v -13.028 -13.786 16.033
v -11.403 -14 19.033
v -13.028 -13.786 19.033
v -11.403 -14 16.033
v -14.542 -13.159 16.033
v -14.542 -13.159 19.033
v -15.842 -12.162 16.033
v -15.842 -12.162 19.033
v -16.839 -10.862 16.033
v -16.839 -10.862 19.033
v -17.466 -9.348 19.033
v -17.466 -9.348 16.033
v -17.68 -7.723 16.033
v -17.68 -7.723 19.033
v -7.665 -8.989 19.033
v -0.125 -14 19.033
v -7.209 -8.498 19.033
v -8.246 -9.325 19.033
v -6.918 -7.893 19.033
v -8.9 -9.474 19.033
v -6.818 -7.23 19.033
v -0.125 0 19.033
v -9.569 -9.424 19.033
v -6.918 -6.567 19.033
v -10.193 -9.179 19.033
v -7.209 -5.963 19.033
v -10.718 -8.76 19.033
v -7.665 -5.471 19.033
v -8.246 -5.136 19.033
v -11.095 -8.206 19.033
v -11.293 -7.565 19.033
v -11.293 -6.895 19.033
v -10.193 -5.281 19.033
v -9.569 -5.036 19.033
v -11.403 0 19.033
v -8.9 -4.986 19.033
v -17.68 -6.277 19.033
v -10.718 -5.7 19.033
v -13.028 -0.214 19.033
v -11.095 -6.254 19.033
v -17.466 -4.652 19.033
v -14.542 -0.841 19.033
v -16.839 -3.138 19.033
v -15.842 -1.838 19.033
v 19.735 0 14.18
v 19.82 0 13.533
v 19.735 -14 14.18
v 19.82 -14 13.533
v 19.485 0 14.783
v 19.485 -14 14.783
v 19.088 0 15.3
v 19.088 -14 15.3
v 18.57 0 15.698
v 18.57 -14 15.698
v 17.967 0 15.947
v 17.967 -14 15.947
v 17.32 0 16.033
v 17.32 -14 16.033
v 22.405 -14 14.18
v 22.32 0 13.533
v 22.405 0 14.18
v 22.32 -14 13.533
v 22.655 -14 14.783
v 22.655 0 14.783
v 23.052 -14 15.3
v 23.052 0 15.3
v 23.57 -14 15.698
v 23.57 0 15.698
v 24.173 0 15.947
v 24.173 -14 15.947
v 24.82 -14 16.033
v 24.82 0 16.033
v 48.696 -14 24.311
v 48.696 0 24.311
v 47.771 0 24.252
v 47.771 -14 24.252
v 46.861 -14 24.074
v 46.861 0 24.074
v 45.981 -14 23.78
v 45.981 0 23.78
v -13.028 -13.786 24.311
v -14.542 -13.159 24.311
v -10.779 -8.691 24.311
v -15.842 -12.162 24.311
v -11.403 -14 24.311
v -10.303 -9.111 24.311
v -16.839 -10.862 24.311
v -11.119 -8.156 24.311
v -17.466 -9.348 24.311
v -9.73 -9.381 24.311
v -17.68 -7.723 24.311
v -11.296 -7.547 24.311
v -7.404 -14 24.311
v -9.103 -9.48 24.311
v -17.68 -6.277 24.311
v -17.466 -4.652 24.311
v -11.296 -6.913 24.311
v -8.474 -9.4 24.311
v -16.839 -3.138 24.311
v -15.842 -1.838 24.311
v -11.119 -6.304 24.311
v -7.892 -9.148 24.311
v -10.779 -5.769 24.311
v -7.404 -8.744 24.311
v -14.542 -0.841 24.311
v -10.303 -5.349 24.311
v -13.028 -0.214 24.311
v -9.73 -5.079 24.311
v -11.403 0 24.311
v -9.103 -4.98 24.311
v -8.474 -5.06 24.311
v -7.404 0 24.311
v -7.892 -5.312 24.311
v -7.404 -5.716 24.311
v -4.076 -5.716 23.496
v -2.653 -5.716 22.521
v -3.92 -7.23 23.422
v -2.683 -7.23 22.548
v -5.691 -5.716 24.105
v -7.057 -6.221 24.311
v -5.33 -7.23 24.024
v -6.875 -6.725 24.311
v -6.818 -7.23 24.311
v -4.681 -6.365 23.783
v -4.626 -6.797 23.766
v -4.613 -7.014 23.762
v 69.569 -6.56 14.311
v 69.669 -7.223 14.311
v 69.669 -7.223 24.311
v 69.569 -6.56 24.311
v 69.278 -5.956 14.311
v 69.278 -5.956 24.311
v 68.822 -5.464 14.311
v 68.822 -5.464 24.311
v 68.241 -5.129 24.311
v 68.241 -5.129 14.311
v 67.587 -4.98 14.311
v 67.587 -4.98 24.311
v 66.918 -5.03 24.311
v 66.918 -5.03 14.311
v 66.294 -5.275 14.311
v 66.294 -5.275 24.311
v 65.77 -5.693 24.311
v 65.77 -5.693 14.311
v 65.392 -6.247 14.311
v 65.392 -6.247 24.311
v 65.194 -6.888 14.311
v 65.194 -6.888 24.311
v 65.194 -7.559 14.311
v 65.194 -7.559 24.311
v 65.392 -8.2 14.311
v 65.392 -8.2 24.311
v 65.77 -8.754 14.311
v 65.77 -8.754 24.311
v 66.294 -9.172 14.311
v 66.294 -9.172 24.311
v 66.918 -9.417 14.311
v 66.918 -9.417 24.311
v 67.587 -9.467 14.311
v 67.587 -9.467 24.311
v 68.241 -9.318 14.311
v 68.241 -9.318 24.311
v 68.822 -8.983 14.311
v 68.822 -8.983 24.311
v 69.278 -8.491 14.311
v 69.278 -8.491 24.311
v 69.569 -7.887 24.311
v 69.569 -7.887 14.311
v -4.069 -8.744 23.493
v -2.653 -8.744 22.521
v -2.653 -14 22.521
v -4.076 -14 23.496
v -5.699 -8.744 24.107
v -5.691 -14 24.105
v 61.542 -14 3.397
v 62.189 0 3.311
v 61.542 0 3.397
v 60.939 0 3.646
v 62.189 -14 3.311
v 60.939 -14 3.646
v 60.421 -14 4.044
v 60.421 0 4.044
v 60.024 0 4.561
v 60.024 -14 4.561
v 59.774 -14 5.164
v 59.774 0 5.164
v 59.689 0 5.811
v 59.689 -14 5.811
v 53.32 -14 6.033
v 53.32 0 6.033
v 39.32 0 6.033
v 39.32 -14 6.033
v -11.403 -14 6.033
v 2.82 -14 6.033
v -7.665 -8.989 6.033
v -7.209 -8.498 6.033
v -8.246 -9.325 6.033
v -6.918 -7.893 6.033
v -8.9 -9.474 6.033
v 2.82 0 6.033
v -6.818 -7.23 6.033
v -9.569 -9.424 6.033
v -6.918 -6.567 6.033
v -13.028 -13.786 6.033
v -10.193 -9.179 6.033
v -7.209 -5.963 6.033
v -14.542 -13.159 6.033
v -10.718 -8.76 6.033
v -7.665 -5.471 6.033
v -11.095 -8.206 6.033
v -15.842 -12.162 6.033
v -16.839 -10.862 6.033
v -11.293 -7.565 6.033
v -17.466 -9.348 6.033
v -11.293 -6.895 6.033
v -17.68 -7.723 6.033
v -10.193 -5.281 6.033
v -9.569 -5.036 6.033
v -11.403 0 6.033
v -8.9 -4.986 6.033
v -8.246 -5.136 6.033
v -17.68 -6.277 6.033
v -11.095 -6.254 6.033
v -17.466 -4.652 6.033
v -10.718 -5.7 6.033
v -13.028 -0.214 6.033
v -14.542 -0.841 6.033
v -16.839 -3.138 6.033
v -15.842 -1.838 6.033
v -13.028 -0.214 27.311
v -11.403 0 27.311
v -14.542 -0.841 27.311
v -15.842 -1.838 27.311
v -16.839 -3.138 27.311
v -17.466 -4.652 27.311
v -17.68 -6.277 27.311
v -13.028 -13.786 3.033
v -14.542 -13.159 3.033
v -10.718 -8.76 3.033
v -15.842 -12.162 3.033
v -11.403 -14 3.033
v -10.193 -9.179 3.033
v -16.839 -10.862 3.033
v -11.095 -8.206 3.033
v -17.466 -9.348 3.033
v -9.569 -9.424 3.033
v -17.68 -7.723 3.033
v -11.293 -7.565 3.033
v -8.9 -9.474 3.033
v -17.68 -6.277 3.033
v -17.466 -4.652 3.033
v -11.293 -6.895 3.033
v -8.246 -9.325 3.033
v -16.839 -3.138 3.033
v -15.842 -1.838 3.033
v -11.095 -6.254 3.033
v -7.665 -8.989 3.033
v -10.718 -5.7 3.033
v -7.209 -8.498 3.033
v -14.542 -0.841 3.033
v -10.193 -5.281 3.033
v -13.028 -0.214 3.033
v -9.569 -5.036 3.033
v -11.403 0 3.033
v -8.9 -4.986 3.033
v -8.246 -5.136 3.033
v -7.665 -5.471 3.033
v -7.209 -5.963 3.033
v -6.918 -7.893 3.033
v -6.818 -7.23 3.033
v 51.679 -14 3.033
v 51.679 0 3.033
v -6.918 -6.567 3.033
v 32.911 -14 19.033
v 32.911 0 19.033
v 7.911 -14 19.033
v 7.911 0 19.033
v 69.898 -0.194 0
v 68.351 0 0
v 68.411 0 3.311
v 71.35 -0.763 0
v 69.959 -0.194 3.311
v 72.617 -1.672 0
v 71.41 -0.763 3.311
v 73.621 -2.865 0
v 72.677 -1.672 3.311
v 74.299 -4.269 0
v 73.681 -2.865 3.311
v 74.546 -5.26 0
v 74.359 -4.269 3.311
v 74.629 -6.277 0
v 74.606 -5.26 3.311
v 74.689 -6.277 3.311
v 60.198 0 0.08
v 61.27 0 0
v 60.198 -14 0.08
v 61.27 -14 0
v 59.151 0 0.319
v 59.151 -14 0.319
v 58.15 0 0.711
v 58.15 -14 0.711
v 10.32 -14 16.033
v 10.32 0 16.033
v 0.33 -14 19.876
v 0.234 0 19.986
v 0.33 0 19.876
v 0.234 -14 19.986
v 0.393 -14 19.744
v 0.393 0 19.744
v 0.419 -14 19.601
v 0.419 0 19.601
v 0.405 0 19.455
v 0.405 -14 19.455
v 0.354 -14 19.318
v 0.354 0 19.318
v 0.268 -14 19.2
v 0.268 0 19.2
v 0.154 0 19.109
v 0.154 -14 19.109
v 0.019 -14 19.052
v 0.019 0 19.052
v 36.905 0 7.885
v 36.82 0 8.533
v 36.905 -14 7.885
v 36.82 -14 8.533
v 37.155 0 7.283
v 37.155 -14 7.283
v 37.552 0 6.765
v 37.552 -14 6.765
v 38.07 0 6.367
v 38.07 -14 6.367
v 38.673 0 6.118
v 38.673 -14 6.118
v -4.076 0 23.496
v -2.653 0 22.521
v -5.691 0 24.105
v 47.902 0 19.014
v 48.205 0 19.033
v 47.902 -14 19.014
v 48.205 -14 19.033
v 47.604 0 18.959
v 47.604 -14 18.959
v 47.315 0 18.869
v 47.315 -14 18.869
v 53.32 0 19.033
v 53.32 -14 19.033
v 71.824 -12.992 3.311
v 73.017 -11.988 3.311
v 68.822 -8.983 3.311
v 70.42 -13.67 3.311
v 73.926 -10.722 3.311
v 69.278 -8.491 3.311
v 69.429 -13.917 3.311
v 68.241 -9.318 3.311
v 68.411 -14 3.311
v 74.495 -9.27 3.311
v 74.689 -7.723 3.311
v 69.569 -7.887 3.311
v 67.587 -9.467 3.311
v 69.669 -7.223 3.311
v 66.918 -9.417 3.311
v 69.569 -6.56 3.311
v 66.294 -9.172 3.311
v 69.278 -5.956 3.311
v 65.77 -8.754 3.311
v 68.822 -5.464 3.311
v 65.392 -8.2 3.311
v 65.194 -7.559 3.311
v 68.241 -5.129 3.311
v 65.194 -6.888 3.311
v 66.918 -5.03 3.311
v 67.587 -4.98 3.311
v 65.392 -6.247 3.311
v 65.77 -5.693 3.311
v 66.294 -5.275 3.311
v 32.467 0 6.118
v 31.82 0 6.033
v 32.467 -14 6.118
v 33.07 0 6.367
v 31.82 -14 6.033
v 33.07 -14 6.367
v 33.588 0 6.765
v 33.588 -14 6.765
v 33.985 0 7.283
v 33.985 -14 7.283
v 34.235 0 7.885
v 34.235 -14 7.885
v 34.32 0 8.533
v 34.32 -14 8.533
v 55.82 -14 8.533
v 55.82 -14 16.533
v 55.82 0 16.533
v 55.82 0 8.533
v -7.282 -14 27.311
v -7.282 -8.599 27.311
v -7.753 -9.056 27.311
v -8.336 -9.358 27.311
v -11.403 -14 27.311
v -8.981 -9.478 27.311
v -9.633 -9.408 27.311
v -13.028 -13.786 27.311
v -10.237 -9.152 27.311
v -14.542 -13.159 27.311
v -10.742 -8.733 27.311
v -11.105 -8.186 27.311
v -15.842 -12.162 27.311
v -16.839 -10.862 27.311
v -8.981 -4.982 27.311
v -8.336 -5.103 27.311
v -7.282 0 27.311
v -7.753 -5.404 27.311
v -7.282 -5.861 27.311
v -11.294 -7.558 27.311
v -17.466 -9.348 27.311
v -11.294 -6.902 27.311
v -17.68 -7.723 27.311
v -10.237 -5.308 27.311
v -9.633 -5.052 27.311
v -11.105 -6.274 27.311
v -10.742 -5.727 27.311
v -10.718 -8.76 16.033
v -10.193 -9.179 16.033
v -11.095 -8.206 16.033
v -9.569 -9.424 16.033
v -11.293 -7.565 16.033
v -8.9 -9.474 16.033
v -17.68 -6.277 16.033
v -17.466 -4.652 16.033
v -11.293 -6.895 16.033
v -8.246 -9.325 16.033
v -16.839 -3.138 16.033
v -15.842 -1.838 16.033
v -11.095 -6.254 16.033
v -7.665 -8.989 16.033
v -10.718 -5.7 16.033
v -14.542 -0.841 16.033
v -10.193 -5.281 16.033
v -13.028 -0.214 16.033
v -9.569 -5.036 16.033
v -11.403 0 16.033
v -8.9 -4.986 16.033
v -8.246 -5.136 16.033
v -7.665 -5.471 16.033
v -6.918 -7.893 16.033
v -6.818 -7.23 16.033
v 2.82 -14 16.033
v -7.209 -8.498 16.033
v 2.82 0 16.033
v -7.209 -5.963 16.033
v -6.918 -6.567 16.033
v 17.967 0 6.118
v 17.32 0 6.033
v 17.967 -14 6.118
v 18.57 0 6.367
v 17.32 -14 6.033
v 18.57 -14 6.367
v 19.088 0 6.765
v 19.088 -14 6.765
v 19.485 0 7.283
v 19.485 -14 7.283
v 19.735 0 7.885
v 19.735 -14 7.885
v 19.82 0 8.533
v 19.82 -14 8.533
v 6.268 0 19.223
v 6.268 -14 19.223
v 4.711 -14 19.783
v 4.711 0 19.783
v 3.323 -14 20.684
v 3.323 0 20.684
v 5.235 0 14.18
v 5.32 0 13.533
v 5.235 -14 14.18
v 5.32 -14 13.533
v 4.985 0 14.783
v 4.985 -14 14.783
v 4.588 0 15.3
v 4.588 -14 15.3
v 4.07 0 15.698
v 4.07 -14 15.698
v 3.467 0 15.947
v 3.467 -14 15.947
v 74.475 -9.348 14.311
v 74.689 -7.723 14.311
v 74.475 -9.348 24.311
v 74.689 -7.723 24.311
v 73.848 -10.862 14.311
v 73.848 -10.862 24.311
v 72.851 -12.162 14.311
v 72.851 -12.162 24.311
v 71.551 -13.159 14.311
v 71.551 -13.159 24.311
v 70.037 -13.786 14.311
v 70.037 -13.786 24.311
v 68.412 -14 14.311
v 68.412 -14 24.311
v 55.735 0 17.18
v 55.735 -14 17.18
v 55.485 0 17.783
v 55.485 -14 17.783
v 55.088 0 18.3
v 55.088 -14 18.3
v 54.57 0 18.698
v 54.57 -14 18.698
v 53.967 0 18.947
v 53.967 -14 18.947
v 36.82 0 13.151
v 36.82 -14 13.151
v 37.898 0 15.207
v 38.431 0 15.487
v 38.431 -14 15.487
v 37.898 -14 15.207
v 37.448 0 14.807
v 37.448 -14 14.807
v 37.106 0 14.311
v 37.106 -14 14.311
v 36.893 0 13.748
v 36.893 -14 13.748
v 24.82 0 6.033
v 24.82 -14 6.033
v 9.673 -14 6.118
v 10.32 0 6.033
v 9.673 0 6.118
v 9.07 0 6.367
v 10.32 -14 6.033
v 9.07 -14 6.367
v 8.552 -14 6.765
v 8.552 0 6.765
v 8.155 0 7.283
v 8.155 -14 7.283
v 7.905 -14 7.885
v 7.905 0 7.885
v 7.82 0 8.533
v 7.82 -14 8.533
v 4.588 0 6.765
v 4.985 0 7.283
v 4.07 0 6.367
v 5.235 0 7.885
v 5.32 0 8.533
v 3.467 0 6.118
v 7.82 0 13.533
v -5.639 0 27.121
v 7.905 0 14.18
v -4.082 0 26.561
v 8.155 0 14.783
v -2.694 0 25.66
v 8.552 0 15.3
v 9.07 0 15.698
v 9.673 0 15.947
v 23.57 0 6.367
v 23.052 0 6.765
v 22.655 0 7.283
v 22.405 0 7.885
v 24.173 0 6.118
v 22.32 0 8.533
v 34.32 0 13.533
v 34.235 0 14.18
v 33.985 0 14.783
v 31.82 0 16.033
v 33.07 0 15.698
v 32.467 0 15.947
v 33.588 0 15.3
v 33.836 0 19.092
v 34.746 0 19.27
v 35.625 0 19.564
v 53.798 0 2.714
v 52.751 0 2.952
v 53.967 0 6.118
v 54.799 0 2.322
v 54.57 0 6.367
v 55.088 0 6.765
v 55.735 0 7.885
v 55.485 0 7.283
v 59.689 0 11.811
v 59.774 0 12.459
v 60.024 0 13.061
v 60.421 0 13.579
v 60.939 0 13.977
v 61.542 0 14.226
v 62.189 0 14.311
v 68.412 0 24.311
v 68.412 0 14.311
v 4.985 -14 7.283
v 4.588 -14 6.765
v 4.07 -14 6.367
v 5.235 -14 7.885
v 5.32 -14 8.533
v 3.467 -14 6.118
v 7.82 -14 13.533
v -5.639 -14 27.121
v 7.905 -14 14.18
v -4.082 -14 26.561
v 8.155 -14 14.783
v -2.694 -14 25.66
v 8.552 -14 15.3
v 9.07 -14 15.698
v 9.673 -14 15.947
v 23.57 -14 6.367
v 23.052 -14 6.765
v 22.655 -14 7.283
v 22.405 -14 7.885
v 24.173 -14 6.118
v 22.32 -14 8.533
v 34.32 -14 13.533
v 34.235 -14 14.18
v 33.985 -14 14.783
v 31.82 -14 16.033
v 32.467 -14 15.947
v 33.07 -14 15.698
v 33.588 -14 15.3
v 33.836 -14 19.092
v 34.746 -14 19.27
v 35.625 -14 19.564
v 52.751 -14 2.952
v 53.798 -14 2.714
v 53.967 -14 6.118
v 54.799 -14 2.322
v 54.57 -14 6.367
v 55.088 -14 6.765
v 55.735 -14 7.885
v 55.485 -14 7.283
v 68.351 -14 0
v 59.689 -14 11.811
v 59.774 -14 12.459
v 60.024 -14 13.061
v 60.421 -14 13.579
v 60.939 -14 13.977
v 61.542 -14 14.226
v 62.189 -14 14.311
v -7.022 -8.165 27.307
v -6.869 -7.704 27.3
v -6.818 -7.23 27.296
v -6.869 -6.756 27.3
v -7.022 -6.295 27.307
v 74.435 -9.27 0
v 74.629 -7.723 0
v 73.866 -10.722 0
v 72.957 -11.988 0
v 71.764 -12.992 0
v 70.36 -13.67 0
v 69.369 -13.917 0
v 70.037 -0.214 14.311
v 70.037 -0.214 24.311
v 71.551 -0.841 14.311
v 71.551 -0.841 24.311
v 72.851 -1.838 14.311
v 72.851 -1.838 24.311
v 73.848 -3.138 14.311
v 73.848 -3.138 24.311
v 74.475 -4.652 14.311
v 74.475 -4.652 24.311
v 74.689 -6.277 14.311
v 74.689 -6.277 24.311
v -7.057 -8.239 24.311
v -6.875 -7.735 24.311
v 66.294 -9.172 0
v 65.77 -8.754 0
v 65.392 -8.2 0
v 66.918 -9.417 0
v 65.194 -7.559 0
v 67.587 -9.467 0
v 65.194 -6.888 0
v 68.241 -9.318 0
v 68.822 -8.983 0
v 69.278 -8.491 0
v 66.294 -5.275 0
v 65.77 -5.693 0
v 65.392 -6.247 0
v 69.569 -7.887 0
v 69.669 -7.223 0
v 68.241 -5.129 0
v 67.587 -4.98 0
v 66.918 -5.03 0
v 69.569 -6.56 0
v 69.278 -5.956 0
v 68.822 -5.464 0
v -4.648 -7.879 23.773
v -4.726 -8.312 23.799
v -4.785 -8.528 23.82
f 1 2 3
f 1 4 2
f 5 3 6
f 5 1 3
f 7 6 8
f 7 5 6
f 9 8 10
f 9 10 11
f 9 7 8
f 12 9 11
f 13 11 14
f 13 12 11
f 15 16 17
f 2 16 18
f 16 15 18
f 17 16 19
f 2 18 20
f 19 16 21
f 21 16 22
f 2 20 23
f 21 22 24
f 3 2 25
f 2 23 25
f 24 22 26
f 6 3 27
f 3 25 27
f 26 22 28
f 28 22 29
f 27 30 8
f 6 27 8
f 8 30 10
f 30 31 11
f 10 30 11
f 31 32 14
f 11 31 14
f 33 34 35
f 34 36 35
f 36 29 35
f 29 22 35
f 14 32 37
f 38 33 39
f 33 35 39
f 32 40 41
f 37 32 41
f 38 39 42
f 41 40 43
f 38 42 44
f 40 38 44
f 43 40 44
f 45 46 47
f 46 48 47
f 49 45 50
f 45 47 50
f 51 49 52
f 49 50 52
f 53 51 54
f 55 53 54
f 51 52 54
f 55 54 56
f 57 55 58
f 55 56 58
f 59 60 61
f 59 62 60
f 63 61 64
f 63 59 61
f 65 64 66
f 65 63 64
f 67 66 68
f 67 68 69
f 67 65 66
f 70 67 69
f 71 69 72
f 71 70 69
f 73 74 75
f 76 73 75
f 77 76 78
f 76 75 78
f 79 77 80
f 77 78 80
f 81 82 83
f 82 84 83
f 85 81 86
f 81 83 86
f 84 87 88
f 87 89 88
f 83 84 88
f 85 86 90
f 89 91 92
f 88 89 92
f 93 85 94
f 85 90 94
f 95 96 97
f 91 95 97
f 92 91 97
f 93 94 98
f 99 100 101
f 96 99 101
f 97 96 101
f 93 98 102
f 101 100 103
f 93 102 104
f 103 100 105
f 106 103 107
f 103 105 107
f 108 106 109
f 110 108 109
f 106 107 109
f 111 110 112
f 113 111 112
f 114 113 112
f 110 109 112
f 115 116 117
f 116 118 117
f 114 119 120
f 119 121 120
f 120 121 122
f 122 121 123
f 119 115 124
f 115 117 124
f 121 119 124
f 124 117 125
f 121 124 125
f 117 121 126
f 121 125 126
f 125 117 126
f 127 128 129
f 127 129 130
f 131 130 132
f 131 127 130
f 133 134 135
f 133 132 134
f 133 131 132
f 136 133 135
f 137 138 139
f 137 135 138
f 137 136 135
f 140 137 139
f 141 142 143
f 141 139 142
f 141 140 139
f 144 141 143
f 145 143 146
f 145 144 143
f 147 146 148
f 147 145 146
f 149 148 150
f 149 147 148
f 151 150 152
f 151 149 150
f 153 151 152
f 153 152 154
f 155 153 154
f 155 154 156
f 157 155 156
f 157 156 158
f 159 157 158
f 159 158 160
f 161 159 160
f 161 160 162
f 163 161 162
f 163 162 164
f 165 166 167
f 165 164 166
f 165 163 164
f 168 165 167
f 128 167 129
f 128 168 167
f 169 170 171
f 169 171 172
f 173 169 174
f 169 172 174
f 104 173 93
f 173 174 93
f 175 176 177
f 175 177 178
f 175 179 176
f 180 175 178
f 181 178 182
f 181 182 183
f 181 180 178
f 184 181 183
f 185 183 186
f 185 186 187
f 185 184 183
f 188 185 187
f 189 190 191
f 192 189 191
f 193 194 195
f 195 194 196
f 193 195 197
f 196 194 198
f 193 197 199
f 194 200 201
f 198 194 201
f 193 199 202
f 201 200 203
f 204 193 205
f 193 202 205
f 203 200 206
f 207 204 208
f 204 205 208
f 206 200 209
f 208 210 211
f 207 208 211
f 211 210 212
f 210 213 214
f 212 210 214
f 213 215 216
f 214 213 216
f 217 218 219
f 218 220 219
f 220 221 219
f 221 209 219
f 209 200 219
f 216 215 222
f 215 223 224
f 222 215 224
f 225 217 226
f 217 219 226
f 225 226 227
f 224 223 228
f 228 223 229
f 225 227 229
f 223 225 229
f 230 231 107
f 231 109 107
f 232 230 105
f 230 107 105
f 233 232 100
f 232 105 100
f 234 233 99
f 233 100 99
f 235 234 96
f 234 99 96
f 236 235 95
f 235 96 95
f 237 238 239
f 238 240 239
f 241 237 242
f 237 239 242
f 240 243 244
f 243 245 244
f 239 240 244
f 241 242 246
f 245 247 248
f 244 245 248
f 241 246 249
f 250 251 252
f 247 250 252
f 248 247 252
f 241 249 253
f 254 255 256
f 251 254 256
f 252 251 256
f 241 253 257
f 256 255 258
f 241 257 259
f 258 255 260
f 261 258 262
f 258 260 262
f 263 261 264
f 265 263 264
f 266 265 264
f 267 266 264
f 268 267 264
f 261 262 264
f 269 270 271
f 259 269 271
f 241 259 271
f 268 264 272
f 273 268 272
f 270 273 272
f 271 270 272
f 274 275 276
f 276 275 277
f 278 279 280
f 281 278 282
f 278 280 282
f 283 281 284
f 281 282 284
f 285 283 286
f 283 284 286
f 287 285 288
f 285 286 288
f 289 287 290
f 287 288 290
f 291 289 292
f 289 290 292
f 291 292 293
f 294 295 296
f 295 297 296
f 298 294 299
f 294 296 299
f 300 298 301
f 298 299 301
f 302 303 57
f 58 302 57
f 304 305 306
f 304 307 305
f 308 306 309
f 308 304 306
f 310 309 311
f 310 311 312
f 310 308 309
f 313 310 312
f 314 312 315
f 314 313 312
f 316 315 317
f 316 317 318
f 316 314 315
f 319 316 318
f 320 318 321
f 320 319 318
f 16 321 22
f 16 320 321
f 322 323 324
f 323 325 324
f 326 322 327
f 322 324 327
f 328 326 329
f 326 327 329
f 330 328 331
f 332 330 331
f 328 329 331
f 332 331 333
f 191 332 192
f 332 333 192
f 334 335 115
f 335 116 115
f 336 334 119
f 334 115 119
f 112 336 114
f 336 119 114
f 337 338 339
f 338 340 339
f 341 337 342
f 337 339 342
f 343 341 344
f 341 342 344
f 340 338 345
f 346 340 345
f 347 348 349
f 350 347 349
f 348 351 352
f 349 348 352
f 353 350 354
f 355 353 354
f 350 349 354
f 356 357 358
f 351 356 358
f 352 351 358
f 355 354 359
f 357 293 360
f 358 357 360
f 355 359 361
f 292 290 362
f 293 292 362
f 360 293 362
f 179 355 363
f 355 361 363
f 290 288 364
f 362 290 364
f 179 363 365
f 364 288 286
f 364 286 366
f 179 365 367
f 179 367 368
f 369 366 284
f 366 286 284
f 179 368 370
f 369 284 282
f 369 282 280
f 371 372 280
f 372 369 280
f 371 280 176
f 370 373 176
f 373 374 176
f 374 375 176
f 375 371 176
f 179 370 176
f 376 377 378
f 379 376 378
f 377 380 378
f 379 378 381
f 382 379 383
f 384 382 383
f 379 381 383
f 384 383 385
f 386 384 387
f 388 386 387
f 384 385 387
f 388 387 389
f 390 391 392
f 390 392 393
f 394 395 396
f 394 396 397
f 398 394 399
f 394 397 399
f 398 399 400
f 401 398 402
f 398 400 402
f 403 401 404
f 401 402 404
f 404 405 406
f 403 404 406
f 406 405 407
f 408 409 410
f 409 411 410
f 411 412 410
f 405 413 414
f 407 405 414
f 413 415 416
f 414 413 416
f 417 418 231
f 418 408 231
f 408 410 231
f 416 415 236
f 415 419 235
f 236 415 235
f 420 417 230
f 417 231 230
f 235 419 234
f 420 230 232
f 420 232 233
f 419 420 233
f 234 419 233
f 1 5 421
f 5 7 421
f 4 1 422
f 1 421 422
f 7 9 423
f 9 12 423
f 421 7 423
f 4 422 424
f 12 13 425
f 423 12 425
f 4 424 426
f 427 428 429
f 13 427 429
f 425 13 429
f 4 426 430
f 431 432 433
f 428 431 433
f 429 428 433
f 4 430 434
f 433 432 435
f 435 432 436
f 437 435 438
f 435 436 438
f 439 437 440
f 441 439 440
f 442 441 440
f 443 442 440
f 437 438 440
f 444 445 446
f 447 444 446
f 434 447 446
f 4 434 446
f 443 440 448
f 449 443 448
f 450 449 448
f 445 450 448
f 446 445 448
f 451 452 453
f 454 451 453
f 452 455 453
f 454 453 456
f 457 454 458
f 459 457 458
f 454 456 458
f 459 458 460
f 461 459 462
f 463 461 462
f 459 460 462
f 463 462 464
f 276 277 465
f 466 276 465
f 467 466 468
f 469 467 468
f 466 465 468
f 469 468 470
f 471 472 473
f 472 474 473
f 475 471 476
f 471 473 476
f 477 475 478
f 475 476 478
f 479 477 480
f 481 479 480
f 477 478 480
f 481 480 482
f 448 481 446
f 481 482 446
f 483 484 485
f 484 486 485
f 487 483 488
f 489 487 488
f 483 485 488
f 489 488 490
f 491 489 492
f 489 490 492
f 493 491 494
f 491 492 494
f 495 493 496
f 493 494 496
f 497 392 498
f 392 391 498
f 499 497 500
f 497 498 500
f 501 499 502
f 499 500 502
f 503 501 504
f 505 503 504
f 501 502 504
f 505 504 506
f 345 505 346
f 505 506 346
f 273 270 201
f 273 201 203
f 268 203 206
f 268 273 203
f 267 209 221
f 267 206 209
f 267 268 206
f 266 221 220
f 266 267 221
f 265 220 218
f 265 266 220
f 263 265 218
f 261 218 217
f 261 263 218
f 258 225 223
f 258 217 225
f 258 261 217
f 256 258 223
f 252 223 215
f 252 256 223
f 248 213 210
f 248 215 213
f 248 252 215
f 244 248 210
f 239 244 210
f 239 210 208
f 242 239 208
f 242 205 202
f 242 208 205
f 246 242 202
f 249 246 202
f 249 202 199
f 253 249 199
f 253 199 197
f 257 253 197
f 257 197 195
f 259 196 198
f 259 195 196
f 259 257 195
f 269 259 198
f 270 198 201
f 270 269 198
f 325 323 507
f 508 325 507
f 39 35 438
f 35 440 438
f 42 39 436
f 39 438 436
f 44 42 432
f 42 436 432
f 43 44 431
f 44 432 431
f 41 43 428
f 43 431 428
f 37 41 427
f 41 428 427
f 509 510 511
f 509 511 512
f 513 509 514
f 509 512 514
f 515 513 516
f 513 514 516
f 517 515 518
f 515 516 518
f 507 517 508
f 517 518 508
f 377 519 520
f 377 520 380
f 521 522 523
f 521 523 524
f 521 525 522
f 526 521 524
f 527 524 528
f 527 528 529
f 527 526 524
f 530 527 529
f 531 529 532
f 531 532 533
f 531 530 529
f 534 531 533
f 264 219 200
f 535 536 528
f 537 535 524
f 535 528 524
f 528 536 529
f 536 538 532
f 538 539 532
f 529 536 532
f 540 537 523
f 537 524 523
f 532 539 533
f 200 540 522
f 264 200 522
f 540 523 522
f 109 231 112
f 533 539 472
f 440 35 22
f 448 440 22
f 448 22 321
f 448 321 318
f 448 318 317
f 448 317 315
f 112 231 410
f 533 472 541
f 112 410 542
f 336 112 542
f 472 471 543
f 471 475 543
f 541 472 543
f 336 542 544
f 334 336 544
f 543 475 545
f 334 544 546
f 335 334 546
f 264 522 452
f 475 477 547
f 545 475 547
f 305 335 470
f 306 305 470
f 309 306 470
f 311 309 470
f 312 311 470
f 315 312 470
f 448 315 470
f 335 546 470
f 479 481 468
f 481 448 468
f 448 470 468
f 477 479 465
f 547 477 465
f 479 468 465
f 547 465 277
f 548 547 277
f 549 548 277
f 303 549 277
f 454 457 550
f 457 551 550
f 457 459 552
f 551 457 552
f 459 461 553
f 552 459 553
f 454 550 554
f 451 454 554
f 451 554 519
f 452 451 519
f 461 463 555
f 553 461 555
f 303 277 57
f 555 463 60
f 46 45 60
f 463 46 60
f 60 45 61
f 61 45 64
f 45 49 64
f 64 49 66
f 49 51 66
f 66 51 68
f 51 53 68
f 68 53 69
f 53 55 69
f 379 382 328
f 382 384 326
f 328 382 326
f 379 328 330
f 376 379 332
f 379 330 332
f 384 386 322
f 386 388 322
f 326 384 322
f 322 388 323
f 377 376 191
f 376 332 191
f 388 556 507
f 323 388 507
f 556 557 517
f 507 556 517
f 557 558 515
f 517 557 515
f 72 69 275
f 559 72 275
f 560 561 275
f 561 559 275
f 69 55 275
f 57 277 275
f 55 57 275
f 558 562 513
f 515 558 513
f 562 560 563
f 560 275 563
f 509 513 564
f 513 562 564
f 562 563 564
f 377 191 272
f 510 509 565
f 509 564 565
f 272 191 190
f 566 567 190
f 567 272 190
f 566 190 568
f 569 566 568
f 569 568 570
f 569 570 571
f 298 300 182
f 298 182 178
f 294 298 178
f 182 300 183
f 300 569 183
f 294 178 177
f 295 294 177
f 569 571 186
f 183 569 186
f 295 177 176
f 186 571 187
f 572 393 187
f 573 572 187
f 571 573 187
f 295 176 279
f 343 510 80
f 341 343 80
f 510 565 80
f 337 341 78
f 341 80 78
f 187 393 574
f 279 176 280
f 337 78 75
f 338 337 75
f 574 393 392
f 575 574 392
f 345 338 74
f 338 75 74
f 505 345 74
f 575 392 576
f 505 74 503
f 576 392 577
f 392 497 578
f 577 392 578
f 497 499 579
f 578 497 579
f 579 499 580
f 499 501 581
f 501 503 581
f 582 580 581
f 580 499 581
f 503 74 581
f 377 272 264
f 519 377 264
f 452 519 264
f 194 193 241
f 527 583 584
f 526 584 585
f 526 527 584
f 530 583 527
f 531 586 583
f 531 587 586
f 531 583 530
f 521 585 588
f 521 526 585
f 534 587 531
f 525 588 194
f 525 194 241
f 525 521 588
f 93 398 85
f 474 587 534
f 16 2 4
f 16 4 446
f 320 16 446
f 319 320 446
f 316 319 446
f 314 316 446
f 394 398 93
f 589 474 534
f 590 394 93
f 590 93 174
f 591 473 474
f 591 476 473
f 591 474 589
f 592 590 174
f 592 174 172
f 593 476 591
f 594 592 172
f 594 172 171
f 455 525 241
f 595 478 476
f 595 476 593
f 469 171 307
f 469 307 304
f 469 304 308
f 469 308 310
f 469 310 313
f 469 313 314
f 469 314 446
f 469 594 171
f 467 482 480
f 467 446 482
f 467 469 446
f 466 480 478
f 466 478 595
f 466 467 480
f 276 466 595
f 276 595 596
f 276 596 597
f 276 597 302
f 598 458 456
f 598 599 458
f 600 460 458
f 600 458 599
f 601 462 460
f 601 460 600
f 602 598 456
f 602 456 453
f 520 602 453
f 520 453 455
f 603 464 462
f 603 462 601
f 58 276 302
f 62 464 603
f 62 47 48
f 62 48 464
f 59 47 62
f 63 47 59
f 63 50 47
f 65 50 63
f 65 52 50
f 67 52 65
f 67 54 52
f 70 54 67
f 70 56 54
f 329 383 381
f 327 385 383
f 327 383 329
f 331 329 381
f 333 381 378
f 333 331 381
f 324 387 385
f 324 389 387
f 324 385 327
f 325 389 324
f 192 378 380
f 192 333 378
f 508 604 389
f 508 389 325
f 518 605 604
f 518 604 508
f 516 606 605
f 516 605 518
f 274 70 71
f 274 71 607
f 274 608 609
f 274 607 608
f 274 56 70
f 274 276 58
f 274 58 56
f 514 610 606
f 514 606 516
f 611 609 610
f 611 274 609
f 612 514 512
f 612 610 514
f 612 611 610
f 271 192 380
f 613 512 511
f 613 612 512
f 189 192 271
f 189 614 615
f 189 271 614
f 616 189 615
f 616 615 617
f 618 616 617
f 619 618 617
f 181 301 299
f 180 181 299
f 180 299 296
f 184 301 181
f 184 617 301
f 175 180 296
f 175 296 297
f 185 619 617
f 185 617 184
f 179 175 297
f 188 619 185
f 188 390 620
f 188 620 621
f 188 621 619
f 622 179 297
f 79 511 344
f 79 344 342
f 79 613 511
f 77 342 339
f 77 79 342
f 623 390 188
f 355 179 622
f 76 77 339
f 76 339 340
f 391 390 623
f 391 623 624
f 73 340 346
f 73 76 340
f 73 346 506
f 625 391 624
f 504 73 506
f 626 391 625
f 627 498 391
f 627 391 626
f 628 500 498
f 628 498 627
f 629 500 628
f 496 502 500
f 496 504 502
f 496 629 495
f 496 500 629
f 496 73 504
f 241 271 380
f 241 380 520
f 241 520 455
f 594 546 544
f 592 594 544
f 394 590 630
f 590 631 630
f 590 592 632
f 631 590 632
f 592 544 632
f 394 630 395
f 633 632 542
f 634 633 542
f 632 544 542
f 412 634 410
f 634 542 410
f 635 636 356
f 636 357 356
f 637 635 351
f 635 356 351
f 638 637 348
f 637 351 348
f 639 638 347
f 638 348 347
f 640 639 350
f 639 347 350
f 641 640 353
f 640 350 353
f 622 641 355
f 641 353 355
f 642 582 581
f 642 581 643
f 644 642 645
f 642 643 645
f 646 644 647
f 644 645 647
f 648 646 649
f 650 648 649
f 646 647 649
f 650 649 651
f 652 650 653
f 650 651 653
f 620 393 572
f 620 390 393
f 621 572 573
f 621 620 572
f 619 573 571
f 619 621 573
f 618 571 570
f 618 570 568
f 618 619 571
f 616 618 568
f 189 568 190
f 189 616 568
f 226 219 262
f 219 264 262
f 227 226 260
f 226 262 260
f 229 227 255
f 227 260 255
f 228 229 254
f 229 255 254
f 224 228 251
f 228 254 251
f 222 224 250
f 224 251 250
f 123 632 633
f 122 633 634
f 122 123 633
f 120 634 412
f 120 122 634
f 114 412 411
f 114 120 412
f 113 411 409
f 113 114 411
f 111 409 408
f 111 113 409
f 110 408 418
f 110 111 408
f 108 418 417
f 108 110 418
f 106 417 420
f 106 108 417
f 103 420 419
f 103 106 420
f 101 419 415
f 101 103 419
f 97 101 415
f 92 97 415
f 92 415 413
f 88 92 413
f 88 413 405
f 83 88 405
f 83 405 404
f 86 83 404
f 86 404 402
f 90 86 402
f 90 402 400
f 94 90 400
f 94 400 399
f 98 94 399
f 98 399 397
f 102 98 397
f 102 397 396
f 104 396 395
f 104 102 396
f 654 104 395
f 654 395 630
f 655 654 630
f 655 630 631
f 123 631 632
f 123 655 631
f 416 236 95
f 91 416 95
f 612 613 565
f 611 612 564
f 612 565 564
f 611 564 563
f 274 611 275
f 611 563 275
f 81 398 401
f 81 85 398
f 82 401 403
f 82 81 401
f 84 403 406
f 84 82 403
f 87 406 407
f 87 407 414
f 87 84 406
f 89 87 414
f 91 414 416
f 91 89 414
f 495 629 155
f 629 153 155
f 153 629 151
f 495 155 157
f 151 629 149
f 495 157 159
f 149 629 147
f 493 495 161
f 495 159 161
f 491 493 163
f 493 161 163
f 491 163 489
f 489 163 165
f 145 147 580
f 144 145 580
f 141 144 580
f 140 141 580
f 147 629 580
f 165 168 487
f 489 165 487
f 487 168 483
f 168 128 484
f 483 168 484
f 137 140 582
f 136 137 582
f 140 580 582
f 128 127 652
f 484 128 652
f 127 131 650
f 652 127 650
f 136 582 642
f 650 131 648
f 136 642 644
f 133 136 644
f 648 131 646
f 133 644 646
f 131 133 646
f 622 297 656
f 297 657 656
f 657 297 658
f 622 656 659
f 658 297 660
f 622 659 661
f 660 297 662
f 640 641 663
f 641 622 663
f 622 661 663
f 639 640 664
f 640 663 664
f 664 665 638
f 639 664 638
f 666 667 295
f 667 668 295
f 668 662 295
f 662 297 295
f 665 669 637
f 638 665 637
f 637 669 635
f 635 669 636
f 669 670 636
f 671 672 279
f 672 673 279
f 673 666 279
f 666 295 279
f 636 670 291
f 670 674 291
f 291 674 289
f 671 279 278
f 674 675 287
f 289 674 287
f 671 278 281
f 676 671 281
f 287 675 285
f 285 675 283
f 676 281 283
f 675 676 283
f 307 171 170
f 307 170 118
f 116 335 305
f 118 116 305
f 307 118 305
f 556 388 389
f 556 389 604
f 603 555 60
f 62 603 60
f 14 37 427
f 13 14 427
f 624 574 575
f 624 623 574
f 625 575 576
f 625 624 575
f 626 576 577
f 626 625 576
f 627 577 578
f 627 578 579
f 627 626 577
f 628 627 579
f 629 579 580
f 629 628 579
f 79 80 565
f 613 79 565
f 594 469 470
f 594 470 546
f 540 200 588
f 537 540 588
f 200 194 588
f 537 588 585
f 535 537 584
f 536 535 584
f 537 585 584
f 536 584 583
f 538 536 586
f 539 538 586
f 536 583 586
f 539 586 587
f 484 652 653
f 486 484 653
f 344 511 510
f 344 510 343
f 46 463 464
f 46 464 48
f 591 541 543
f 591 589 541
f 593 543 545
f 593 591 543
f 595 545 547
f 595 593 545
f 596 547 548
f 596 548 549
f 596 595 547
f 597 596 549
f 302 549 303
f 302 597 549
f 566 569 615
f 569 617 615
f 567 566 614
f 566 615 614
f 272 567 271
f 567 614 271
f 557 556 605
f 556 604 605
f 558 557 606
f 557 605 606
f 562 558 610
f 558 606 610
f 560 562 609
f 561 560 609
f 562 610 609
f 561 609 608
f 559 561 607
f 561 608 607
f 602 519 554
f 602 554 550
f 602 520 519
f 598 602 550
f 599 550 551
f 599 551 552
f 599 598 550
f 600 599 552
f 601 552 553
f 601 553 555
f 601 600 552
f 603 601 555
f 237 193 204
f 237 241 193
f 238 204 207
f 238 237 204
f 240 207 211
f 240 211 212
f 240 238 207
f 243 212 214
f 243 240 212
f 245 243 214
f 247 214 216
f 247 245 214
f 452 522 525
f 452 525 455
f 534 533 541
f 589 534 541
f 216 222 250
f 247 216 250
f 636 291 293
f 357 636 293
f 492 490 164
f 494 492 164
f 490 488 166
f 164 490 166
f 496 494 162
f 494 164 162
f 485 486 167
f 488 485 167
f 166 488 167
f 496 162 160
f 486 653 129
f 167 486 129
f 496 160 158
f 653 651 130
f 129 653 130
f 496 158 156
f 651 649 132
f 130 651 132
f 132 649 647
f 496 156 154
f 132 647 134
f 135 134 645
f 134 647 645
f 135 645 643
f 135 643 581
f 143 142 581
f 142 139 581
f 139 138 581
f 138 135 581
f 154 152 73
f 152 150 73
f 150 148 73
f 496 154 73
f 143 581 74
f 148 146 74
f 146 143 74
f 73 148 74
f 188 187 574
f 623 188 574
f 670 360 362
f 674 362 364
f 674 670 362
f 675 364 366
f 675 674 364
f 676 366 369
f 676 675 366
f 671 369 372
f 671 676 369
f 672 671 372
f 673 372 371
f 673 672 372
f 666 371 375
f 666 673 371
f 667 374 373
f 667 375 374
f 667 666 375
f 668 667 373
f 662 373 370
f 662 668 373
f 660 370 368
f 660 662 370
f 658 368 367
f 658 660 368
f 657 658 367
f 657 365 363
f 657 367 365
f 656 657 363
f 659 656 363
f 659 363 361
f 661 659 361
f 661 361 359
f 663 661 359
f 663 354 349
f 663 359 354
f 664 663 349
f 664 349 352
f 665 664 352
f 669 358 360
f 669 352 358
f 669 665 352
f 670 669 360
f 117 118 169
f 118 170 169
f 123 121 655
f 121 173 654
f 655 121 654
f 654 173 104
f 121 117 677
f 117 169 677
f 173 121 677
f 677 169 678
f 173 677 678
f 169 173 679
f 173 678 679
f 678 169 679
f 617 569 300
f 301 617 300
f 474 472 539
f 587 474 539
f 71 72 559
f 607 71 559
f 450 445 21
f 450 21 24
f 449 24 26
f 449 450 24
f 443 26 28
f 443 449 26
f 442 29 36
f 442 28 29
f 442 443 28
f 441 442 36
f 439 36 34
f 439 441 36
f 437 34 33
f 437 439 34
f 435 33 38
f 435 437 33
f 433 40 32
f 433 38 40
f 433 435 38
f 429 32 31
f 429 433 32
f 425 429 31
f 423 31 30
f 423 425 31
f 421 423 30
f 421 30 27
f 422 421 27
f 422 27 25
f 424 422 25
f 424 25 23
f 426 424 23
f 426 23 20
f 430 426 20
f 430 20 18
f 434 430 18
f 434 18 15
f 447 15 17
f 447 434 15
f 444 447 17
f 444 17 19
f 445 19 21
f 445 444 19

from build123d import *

# Parameters (mm, degrees)
F0_W         = 12
F0_H         = 10
F1_DEPTH     = 14
F2_R         = 2.25
F3_DEPTH     = 99.1
F4_DEPTH     = 25
F5_R         = 6.2769552622
F6_R         = 6.2769552622
F7_R         = 2.5
F8_R         = 2.5
F9_R         = 2.5
F10_R        = 2.5
F11_T1_DEPTH = 14
F11_T3_DEPTH = 21.0473321416
F11_T5_DEPTH = 26.9573104187
F12_R        = 7.2
F13_R        = 7.2
F14_R        = 0.5445837107


# Not quite as in the source:
# - a fillet or chamfer that OpenCascade refuses, or shapes differently, is made with other operations: its cross-section is extruded or revolved along the edge and cut away or added


with BuildPart() as f1:
    # F0 (on Front) → F1 (new body)
    with BuildSketch(Plane.XZ):
        Polygon((59.6290528774, 0), (74.6290528774, 0), (74.6890899837, 3.3114668612), (59.6890899837, 3.3114668612), (59.6890899837, 14.3114668612), (74.6890899837, 14.3114668612), (74.6890899837, 24.3114668612), (47.2866145434, 24.3114668612), (34.3200196198, 19.0325071069), (5.3200196198, 19.0325071069), (-4.6910188856, 27.3114668612), (-17.6799803802, 27.3114668612), (-17.6799803802, 24.3114668612), (-4.6910188856, 24.3114668612), (1.3200196198, 19.0325071069), (-17.6799803802, 19.0325071069), (-17.6799803802, 16.0325071069), (5.3200196198, 16.0325071069), (5.3200196198, 6.0325071069), (-17.6799803802, 6.0325071069), (-17.6799803802, 3.0325071069), (53.3200196198, 3.0325071069), align=None)
        with Locations((13.8200196198, 11.0325071069)):
            Rectangle(F0_W, F0_H, mode=Mode.SUBTRACT)
        with Locations((28.3200196198, 11.0325071069)):
            Rectangle(F0_W, F0_H, mode=Mode.SUBTRACT)
        Polygon((55.8200196198, 6.0325071069), (36.8200196198, 6.0325071069), (36.8200196198, 14.8739311844), (47.7449782193, 19.0325071069), (55.8200196198, 19.0325071069), align=None, mode=Mode.SUBTRACT)
    extrude(amount=F1_DEPTH)

    # F2 (on Top) → F3 (cut)
    with BuildSketch(Plane.XY):
        with Locations((-9.0681398287, -7.2300466709)):
            Circle(F2_R)
        with Locations((67.4190670252, -7.2234715335)):
            Circle(F2_R)
    extrude(amount=F3_DEPTH, mode=Mode.SUBTRACT)

    # F2 (on Top) → F4 (cut)
    with BuildSketch(Plane.XY):
        with Locations((-9.0681398287, -7.2300466709)):
            Circle(F2_R)
        with Locations((67.4190670252, -7.2234715335)):
            Circle(F2_R)
    extrude(amount=-F4_DEPTH, mode=Mode.SUBTRACT)

    # F5
    f5_edges = [f1.edges().sort_by_distance(p)[0] for p in [
        (-17.67998, -14, 25.811467),
        (-17.67998, 0, 25.811467),
        (-17.67998, -14, 17.532507),
        (-17.67998, 0, 17.532507),
        (-17.67998, 0, 4.532507),
        (-17.67998, -14, 4.532507),
    ]]
    fillet(f5_edges, radius=F5_R)

    # F6
    f6_edges = [f1.edges().sort_by_distance(p)[0] for p in [
        (74.68909, -14, 19.311467),
        (74.68909, 0, 19.311467),
        (74.659071, -14, 1.655733),
        (74.659071, 0, 1.655733),
    ]]
    fillet(f6_edges, radius=F6_R)

    # F7
    f7_edges = [f1.edges().sort_by_distance(p)[0] for p in [
        (36.82002, -7, 6.032507),
        (36.82002, -7, 14.873931),
        (47.744978, -7, 19.032507),
        (55.82002, -7, 19.032507),
        (55.82002, -7, 6.032507),
    ]]
    fillet(f7_edges, radius=F7_R)

    # F8
    f8_edges = [f1.edges().sort_by_distance(p)[0] for p in [
        (34.32002, -7, 16.032507),
        (22.32002, -7, 16.032507),
        (22.32002, -7, 6.032507),
        (34.32002, -7, 6.032507),
    ]]
    fillet(f8_edges, radius=F8_R)

    # F9
    f9_edges = [f1.edges().sort_by_distance(p)[0] for p in [
        (19.82002, -7, 16.032507),
        (7.82002, -7, 16.032507),
        (7.82002, -7, 6.032507),
        (19.82002, -7, 6.032507),
    ]]
    fillet(f9_edges, radius=F9_R)

    # F10
    f10_edges = [f1.edges().sort_by_distance(p)[0] for p in [
        (5.32002, -7, 16.032507),
        (5.32002, -7, 6.032507),
        (59.68909, -7, 14.311467),
        (59.68909, -7, 3.311467),
    ]]
    fillet(f10_edges, radius=F10_R)

    # F11: fillet of radius 7.2 on 4 edges, made by hand

    # F11_s2 → F11_t1 (join)
    with BuildSketch(Plane.XZ):
        with BuildLine():
            ThreePointArc((35.6254467793, 19.5639725748), (34.2937652809, 19.1666225681), (32.9105531914, 19.0325071069))
            Line((32.9105531914, 19.0325071069), (34.3200196198, 19.0325071069))
            Line((34.3200196198, 19.0325071069), (35.6254467793, 19.5639725748))
        make_face()
        with BuildLine():
            ThreePointArc((7.9114817035, 19.0325071069), (5.4731495991, 19.457956454), (3.3229804953, 20.6840247322))
            Line((3.3229804953, 20.6840247322), (5.3200196198, 19.0325071069))
            Line((5.3200196198, 19.0325071069), (7.9114817035, 19.0325071069))
        make_face()
    extrude(amount=F11_T1_DEPTH)

    # F11_s4 → F11_t3 (cut)
    with BuildSketch(Plane.XZ.offset(-3.5236660708)):
        with BuildLine():
            ThreePointArc((48.6960809717, 24.3114668612), (47.3128688823, 24.1773514), (45.9811873838, 23.7800013933))
            Line((45.9811873838, 23.7800013933), (47.2866145434, 24.3114668612))
            Line((47.2866145434, 24.3114668612), (48.6960809717, 24.3114668612))
        make_face()
    extrude(amount=F11_T3_DEPTH, mode=Mode.SUBTRACT)

    # F11_s6 → F11_t5 (cut)
    with BuildSketch(Plane.XZ.offset(-6.4786552093)):
        with BuildLine():
            ThreePointArc((-2.6939797611, 25.6599492359), (-4.844148865, 26.8860175141), (-7.2824809693, 27.3114668612))
            Line((-7.2824809693, 27.3114668612), (-4.6910188856, 27.3114668612))
            Line((-4.6910188856, 27.3114668612), (-2.6939797611, 25.6599492359))
        make_face()
    extrude(amount=F11_T5_DEPTH, mode=Mode.SUBTRACT)

    # F12
    f12_edges = [f1.edges().sort_by_distance(p)[0] for p in [
        (53.32002, -7, 3.032507),
        (59.629053, -7, 0),
    ]]
    fillet(f12_edges, radius=F12_R)

    # F13
    f13_edges = [f1.edges().sort_by_distance(p)[0] for p in [
        (-4.691019, -7, 24.311467),
    ]]
    fillet(f13_edges, radius=F13_R)

    # F14
    f14_edges = [f1.edges().sort_by_distance(p)[0] for p in [
        (1.32002, -7, 19.032507),
    ]]
    fillet(f14_edges, radius=F14_R)


solid = f1.part
